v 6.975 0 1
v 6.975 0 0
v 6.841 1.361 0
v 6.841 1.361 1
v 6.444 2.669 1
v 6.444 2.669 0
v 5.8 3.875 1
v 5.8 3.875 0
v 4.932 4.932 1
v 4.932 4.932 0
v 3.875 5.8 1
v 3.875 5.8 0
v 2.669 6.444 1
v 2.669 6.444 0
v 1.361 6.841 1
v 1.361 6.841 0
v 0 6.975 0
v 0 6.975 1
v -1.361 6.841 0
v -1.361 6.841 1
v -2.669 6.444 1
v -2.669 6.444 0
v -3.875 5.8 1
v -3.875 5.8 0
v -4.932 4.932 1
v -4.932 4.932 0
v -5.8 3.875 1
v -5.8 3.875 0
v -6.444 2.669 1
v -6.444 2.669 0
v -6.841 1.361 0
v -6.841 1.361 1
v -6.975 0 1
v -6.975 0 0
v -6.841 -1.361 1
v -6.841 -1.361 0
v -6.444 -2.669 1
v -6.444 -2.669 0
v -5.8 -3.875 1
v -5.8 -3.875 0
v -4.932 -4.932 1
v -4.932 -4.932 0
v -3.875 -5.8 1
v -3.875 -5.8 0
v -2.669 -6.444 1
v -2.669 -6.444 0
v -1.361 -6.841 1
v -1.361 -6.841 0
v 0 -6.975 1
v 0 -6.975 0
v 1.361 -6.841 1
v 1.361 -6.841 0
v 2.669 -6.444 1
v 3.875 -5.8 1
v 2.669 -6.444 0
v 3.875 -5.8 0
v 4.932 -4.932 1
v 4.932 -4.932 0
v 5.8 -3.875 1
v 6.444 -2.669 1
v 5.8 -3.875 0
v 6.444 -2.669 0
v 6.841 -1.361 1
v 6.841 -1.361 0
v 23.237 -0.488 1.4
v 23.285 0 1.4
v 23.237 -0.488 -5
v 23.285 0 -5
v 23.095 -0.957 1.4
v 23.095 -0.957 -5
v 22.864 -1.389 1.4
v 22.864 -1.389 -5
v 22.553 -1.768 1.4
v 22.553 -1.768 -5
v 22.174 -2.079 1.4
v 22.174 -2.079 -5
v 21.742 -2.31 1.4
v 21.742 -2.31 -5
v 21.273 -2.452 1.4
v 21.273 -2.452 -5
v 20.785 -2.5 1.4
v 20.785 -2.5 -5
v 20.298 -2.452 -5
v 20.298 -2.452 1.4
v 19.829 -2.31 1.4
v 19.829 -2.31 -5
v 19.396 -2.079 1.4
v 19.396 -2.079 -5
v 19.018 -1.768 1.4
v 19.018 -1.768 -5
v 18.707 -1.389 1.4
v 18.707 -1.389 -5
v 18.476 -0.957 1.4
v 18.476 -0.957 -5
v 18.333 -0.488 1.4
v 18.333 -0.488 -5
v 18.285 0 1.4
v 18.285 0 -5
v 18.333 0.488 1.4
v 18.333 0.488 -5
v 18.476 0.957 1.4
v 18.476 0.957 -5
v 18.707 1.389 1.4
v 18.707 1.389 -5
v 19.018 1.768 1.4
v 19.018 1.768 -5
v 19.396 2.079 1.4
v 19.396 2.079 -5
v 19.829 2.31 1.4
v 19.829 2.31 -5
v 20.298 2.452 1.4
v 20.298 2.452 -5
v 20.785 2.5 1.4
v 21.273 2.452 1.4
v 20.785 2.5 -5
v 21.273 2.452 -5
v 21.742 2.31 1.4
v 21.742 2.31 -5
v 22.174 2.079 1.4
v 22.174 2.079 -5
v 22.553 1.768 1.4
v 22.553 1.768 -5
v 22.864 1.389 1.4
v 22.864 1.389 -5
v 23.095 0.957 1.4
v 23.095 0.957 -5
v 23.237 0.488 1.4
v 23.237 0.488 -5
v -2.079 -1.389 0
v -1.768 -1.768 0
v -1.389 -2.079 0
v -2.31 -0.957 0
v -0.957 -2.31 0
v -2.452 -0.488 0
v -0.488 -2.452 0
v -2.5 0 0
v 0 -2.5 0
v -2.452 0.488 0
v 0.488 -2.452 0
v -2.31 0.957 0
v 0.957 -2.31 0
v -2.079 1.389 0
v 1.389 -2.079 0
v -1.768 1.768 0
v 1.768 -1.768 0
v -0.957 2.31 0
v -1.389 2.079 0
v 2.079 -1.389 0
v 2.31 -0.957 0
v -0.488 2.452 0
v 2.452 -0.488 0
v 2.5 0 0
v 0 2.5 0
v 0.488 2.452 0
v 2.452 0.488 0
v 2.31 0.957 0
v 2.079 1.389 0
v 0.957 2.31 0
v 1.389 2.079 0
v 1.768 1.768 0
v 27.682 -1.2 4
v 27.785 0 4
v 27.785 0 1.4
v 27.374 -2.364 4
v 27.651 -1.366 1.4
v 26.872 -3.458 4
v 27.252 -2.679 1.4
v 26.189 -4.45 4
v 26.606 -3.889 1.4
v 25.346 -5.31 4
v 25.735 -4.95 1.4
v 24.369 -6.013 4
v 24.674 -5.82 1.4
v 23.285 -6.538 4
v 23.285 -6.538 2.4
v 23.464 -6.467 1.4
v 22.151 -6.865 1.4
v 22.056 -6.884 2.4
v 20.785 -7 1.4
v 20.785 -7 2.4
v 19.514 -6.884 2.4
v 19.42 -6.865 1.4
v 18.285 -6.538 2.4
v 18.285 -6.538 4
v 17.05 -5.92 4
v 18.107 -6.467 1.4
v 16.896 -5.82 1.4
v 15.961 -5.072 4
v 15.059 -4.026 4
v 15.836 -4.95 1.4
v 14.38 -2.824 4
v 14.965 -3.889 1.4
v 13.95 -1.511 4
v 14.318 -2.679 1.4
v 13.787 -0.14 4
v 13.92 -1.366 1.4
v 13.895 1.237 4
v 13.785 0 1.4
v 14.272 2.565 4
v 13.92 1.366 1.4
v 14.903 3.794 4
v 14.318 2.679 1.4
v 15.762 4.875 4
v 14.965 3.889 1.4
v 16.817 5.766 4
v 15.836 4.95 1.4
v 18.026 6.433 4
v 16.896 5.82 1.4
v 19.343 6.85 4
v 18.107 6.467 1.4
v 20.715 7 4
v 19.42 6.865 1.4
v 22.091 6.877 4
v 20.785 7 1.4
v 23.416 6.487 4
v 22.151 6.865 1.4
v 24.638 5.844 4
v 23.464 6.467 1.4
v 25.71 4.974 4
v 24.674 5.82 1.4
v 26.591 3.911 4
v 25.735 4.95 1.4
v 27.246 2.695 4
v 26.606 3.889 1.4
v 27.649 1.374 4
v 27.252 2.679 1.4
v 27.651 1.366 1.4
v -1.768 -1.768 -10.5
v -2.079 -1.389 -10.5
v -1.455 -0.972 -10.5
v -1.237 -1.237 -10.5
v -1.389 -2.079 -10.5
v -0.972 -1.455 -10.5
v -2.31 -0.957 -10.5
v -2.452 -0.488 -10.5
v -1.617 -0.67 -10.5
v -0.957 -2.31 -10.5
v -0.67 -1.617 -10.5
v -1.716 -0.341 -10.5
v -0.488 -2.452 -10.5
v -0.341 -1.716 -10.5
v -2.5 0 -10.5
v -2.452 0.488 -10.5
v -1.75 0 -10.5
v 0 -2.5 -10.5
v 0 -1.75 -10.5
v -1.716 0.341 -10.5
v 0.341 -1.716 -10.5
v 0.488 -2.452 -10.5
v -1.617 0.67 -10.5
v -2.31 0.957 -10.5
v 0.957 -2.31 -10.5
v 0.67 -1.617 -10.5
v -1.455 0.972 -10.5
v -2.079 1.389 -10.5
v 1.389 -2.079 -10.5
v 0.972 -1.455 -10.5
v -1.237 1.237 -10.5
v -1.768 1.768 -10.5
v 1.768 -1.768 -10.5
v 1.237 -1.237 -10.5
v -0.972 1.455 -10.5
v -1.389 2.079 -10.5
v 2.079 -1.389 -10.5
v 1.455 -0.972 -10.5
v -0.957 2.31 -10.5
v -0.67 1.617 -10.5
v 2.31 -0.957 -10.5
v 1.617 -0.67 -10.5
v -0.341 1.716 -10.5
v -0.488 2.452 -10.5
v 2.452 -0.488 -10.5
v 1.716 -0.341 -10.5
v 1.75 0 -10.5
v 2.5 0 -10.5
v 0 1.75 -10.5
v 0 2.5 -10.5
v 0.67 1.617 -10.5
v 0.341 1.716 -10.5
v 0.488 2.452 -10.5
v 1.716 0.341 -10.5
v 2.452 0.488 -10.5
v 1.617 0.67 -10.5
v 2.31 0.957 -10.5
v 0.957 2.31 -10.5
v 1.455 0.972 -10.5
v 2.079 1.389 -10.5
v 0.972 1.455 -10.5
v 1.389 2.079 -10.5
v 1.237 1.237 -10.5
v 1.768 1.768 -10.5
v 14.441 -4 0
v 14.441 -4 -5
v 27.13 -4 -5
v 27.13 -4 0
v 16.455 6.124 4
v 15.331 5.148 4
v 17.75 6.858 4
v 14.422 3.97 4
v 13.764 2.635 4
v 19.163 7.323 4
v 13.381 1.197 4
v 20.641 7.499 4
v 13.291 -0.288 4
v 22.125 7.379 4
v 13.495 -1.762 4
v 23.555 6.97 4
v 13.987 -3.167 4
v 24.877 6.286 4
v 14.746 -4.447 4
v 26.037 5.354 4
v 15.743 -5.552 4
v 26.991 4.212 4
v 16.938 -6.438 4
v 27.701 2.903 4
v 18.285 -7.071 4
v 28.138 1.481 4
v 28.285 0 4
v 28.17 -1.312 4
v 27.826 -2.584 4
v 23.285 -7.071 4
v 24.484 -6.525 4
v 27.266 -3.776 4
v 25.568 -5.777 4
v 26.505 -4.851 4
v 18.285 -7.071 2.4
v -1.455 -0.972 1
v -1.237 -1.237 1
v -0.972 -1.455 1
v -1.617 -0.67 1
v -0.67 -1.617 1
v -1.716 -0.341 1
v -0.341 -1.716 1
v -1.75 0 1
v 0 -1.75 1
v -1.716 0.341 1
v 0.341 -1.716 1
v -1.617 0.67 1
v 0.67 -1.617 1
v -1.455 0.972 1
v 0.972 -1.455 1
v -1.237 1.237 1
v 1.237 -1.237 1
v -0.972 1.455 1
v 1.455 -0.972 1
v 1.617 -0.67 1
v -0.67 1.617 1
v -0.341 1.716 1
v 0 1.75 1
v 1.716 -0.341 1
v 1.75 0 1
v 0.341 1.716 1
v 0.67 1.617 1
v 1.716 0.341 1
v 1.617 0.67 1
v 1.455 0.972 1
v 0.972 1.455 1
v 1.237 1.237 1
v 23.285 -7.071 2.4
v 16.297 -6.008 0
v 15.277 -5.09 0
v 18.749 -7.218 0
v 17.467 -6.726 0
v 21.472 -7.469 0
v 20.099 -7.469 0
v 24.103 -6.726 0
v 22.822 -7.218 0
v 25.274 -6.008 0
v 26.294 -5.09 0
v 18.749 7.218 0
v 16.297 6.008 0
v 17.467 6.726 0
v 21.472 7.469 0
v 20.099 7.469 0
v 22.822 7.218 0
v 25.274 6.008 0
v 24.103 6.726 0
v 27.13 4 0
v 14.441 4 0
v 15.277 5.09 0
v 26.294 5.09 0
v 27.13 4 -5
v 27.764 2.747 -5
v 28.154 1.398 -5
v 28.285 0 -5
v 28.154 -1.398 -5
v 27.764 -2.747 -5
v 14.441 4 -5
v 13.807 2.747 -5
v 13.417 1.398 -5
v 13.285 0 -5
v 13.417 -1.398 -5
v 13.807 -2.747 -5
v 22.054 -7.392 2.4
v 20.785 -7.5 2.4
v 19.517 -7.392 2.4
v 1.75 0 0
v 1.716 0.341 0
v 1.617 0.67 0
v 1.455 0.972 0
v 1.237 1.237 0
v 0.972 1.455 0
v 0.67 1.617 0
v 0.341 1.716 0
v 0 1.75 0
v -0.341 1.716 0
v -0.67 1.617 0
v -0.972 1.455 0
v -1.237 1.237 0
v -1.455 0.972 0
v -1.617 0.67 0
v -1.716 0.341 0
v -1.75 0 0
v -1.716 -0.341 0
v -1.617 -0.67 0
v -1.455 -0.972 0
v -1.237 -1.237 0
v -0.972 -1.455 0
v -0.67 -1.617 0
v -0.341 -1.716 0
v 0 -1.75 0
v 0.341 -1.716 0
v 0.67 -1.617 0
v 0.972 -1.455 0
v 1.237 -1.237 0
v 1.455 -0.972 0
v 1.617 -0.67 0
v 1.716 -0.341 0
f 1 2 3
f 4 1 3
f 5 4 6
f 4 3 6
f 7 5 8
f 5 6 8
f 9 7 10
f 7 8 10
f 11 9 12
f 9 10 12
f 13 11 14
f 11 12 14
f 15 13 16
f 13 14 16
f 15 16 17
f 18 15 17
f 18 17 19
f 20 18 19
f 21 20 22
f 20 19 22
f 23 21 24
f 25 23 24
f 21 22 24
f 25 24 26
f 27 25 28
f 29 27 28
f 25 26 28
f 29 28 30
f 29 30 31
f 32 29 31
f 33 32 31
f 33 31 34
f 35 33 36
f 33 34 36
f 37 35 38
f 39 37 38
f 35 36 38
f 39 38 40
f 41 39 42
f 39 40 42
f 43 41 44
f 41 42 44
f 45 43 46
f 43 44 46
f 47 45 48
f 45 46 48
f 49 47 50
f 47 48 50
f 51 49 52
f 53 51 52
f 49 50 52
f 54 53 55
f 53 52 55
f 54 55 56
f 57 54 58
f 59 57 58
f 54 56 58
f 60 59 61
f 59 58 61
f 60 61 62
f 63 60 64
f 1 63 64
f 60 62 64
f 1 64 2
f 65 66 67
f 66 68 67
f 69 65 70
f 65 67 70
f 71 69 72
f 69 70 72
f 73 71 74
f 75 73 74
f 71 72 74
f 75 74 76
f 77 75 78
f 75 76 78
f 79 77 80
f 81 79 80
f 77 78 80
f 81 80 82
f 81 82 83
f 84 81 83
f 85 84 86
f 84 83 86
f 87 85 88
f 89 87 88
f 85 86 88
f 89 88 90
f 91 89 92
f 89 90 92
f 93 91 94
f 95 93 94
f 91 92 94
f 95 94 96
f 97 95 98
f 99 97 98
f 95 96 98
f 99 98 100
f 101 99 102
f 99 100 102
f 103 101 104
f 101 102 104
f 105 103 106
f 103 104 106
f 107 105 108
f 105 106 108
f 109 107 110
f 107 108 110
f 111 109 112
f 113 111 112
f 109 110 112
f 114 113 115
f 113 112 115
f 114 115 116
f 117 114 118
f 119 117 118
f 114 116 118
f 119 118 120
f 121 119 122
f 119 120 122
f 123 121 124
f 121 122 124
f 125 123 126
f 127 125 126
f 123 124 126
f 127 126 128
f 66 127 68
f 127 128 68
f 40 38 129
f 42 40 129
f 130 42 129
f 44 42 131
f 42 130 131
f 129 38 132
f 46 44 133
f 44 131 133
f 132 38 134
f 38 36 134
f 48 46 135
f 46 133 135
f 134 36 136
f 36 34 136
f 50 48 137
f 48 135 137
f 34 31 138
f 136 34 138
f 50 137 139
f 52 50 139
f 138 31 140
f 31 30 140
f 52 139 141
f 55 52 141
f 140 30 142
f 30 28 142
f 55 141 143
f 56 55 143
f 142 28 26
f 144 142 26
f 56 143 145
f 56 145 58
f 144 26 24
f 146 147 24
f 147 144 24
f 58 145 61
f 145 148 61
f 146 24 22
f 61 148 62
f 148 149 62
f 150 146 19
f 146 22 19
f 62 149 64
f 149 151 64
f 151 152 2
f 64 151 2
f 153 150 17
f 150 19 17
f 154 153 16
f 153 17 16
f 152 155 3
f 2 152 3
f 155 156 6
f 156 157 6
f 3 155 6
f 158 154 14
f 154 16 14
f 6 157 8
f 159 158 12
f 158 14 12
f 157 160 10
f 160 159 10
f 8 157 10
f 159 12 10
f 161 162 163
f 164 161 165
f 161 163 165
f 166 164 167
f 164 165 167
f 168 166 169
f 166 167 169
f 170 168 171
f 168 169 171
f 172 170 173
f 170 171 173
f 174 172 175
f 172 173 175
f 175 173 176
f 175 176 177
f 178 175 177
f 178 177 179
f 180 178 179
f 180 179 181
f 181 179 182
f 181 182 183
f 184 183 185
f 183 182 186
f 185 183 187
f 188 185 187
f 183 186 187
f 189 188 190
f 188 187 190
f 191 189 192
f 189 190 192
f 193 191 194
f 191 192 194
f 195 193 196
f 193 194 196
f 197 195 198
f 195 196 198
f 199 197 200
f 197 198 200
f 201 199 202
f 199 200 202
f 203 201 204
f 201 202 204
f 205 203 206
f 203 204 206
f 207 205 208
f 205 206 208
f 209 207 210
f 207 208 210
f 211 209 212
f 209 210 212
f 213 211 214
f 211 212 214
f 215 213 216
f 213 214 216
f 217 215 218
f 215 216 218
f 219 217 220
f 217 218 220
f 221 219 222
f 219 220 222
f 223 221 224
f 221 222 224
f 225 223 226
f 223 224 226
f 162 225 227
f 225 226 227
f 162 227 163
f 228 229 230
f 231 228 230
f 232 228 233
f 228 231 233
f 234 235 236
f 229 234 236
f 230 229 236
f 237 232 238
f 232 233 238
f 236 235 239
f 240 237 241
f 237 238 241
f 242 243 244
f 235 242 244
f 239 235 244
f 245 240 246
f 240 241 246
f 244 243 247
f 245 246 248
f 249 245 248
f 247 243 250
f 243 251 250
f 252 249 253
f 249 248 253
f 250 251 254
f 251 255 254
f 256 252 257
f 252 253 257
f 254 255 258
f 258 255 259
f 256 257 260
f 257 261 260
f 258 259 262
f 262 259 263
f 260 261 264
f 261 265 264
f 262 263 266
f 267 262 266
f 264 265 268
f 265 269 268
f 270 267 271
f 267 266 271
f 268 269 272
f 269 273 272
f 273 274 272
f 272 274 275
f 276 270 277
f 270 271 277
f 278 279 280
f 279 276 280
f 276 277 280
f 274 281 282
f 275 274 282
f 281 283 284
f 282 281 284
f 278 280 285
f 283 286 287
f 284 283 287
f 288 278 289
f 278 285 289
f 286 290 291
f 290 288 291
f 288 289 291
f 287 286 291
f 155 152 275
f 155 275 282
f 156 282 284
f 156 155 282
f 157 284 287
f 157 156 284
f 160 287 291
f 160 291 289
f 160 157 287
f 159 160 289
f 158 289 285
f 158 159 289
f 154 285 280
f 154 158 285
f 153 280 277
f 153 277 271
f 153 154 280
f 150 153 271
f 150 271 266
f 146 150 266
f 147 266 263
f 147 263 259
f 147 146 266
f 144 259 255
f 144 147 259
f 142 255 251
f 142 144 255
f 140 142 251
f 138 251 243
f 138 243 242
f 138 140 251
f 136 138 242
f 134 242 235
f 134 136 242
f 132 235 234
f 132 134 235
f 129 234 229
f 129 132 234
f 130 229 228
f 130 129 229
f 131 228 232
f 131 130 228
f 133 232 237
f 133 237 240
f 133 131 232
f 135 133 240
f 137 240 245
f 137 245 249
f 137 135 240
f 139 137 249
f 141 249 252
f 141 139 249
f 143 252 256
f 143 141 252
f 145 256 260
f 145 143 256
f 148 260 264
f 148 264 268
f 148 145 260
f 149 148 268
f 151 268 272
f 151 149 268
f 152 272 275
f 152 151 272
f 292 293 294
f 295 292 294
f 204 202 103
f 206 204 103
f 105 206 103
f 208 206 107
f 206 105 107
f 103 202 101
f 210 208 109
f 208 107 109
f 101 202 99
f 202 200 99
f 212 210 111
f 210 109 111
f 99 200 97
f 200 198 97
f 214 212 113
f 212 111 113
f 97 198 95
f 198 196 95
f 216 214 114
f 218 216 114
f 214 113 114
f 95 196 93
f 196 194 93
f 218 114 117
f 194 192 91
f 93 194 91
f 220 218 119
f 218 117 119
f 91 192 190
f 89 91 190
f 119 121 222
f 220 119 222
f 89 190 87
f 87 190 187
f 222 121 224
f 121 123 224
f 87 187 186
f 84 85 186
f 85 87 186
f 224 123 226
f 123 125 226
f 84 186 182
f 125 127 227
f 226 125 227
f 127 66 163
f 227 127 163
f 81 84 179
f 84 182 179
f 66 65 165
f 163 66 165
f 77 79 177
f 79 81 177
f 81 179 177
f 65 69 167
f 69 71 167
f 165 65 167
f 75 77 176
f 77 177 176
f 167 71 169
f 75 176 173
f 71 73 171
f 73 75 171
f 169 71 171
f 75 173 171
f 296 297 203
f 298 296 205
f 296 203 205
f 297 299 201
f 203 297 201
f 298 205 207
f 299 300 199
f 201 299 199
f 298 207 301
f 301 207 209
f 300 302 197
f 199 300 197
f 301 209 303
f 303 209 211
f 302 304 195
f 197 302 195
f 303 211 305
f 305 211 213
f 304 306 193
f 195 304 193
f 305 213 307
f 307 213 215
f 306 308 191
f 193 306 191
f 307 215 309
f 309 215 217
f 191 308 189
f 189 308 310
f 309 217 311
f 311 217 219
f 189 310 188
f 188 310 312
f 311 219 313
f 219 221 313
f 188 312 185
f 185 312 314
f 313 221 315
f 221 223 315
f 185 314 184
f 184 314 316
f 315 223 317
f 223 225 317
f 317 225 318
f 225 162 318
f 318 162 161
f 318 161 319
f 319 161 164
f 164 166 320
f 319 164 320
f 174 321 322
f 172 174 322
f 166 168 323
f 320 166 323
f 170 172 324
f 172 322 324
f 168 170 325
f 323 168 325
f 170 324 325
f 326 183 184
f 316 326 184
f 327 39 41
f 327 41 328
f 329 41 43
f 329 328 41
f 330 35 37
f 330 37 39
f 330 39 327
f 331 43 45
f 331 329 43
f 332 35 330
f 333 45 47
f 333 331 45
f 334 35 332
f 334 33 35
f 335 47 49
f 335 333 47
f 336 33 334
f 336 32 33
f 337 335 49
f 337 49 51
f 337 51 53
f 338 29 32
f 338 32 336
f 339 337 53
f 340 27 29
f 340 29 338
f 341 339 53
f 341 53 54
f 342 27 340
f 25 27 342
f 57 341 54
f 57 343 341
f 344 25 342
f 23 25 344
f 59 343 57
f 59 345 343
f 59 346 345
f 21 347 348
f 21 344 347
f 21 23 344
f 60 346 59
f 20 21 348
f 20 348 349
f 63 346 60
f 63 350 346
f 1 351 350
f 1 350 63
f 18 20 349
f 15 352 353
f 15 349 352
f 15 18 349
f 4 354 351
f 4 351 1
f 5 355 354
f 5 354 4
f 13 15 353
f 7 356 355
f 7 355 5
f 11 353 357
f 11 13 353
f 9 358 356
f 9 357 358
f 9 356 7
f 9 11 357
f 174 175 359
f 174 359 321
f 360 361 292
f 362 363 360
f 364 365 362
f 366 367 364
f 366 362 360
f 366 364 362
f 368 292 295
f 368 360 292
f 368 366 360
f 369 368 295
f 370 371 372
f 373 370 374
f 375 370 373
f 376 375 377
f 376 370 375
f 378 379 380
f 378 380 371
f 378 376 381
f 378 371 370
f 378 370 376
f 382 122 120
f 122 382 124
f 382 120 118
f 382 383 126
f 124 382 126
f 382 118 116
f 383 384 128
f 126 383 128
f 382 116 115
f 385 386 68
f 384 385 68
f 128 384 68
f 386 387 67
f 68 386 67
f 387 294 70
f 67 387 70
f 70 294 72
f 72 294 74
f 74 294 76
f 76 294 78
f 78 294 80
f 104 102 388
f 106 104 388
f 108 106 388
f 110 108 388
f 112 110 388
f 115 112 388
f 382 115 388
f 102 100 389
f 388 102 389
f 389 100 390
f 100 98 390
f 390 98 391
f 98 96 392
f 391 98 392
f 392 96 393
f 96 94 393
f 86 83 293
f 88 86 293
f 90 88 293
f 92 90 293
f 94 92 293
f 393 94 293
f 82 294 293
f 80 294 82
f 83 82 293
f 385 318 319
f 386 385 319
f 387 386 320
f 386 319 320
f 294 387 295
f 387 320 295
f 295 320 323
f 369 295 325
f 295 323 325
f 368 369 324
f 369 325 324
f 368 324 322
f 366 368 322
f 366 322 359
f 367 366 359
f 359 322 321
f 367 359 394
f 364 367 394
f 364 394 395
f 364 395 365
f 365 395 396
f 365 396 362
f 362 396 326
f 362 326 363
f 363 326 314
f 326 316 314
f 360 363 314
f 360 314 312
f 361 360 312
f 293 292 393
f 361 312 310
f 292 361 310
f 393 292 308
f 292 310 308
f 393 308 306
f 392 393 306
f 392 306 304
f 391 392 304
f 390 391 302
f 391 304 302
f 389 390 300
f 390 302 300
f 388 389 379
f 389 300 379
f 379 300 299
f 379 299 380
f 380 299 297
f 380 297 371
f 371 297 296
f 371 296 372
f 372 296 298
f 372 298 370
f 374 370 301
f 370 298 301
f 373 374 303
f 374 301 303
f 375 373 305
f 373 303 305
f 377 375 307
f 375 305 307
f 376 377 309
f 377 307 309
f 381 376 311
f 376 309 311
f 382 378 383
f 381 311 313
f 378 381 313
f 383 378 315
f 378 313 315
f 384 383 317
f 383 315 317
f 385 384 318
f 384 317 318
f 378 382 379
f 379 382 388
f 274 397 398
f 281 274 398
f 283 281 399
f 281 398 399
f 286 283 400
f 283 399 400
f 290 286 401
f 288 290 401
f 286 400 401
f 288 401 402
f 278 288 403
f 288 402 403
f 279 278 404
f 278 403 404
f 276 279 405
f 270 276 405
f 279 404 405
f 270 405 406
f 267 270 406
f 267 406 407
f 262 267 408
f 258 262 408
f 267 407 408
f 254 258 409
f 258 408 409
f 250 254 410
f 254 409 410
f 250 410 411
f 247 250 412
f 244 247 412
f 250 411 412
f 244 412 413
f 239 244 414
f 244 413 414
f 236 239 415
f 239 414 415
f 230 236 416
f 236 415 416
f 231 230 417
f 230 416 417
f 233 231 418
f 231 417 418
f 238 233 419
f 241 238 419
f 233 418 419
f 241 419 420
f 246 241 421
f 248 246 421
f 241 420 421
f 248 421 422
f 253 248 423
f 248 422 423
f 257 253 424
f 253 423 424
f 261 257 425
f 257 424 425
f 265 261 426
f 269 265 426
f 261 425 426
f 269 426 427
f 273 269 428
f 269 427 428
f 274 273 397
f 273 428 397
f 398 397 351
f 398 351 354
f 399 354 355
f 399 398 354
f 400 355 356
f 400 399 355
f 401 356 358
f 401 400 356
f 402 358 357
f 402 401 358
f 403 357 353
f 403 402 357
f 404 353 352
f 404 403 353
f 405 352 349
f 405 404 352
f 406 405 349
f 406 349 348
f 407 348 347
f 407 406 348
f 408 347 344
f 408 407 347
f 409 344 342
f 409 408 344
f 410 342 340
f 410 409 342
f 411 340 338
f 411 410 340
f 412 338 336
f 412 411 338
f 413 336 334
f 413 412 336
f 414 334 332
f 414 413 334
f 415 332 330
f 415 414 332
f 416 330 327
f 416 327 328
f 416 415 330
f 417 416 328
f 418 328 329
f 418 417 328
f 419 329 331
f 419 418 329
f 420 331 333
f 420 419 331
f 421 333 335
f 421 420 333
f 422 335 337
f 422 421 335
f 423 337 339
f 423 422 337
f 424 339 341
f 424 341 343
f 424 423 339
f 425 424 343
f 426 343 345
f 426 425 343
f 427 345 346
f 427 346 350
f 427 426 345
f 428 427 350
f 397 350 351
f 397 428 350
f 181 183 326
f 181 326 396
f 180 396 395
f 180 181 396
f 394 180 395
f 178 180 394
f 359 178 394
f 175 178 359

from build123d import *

# Parameters (mm, degrees)
F0_R     = 6.975
F0_R_2   = 2.5
F0_R_3   = 1.75
F1_DEPTH = 1
F2_DEPTH = 10.5
F5_W     = 5
F5_H     = 1.6
F6_DEPTH = 7.501
F8_DEPTH = 5


# Not quite as in the source:
# - a feature names something its author has since deleted; it is built from what else it names


with BuildPart() as f1:
    # F0 (on Top) → F1 (new body)
    with BuildSketch(Plane.XY):
        Circle(F0_R)
        Circle(F0_R_2, mode=Mode.SUBTRACT)
        Circle(F0_R_2)
        Circle(F0_R_3, mode=Mode.SUBTRACT)
    extrude(amount=F1_DEPTH)

    # F0 (on Top) → F2 (join)
    with BuildSketch(Plane.XY):
        Circle(F0_R_2)
        Circle(F0_R_3, mode=Mode.SUBTRACT)
    extrude(amount=-F2_DEPTH)


with BuildPart() as f4:
    # F3 (on Front) → F4 (revolve)
    with BuildSketch(Plane.XZ):
        Polygon((28.2853133976, -5), (28.2853133976, 4), (27.7853133976, 4), (27.7853133976, 1.4), (23.2853133976, 1.4), (23.2853133976, -5), align=None)
    revolve(axis=Axis((20.7853133976, 0, -0.6741590851), (0, 0, -1)))

    # F5 (on Front) → F6 (cut, through all)
    with BuildSketch(Plane.XZ):
        with Locations((20.7853133976, 3.2)):
            Rectangle(F5_W, F5_H)
    extrude(amount=F6_DEPTH, mode=Mode.SUBTRACT)

    # F7 (on face) → F8 (cut)
    with BuildSketch(Plane(origin=(0, 0, -5), x_dir=(1, 0, 0), z_dir=(0, 0, -1))):
        with BuildLine():
            ThreePointArc((27.1296021679, 4), (20.7853133976, 7.5), (14.4410246274, 4))
            Line((14.4410246274, 4), (27.1296021679, 4))
        make_face()
        with BuildLine():
            Line((27.1296021679, -4), (14.4410246274, -4))
            ThreePointArc((14.4410246274, -4), (20.7853133976, -7.5), (27.1296021679, -4))
        make_face()
    extrude(amount=-F8_DEPTH, mode=Mode.SUBTRACT)


solid = Compound([f1.part, f4.part])
